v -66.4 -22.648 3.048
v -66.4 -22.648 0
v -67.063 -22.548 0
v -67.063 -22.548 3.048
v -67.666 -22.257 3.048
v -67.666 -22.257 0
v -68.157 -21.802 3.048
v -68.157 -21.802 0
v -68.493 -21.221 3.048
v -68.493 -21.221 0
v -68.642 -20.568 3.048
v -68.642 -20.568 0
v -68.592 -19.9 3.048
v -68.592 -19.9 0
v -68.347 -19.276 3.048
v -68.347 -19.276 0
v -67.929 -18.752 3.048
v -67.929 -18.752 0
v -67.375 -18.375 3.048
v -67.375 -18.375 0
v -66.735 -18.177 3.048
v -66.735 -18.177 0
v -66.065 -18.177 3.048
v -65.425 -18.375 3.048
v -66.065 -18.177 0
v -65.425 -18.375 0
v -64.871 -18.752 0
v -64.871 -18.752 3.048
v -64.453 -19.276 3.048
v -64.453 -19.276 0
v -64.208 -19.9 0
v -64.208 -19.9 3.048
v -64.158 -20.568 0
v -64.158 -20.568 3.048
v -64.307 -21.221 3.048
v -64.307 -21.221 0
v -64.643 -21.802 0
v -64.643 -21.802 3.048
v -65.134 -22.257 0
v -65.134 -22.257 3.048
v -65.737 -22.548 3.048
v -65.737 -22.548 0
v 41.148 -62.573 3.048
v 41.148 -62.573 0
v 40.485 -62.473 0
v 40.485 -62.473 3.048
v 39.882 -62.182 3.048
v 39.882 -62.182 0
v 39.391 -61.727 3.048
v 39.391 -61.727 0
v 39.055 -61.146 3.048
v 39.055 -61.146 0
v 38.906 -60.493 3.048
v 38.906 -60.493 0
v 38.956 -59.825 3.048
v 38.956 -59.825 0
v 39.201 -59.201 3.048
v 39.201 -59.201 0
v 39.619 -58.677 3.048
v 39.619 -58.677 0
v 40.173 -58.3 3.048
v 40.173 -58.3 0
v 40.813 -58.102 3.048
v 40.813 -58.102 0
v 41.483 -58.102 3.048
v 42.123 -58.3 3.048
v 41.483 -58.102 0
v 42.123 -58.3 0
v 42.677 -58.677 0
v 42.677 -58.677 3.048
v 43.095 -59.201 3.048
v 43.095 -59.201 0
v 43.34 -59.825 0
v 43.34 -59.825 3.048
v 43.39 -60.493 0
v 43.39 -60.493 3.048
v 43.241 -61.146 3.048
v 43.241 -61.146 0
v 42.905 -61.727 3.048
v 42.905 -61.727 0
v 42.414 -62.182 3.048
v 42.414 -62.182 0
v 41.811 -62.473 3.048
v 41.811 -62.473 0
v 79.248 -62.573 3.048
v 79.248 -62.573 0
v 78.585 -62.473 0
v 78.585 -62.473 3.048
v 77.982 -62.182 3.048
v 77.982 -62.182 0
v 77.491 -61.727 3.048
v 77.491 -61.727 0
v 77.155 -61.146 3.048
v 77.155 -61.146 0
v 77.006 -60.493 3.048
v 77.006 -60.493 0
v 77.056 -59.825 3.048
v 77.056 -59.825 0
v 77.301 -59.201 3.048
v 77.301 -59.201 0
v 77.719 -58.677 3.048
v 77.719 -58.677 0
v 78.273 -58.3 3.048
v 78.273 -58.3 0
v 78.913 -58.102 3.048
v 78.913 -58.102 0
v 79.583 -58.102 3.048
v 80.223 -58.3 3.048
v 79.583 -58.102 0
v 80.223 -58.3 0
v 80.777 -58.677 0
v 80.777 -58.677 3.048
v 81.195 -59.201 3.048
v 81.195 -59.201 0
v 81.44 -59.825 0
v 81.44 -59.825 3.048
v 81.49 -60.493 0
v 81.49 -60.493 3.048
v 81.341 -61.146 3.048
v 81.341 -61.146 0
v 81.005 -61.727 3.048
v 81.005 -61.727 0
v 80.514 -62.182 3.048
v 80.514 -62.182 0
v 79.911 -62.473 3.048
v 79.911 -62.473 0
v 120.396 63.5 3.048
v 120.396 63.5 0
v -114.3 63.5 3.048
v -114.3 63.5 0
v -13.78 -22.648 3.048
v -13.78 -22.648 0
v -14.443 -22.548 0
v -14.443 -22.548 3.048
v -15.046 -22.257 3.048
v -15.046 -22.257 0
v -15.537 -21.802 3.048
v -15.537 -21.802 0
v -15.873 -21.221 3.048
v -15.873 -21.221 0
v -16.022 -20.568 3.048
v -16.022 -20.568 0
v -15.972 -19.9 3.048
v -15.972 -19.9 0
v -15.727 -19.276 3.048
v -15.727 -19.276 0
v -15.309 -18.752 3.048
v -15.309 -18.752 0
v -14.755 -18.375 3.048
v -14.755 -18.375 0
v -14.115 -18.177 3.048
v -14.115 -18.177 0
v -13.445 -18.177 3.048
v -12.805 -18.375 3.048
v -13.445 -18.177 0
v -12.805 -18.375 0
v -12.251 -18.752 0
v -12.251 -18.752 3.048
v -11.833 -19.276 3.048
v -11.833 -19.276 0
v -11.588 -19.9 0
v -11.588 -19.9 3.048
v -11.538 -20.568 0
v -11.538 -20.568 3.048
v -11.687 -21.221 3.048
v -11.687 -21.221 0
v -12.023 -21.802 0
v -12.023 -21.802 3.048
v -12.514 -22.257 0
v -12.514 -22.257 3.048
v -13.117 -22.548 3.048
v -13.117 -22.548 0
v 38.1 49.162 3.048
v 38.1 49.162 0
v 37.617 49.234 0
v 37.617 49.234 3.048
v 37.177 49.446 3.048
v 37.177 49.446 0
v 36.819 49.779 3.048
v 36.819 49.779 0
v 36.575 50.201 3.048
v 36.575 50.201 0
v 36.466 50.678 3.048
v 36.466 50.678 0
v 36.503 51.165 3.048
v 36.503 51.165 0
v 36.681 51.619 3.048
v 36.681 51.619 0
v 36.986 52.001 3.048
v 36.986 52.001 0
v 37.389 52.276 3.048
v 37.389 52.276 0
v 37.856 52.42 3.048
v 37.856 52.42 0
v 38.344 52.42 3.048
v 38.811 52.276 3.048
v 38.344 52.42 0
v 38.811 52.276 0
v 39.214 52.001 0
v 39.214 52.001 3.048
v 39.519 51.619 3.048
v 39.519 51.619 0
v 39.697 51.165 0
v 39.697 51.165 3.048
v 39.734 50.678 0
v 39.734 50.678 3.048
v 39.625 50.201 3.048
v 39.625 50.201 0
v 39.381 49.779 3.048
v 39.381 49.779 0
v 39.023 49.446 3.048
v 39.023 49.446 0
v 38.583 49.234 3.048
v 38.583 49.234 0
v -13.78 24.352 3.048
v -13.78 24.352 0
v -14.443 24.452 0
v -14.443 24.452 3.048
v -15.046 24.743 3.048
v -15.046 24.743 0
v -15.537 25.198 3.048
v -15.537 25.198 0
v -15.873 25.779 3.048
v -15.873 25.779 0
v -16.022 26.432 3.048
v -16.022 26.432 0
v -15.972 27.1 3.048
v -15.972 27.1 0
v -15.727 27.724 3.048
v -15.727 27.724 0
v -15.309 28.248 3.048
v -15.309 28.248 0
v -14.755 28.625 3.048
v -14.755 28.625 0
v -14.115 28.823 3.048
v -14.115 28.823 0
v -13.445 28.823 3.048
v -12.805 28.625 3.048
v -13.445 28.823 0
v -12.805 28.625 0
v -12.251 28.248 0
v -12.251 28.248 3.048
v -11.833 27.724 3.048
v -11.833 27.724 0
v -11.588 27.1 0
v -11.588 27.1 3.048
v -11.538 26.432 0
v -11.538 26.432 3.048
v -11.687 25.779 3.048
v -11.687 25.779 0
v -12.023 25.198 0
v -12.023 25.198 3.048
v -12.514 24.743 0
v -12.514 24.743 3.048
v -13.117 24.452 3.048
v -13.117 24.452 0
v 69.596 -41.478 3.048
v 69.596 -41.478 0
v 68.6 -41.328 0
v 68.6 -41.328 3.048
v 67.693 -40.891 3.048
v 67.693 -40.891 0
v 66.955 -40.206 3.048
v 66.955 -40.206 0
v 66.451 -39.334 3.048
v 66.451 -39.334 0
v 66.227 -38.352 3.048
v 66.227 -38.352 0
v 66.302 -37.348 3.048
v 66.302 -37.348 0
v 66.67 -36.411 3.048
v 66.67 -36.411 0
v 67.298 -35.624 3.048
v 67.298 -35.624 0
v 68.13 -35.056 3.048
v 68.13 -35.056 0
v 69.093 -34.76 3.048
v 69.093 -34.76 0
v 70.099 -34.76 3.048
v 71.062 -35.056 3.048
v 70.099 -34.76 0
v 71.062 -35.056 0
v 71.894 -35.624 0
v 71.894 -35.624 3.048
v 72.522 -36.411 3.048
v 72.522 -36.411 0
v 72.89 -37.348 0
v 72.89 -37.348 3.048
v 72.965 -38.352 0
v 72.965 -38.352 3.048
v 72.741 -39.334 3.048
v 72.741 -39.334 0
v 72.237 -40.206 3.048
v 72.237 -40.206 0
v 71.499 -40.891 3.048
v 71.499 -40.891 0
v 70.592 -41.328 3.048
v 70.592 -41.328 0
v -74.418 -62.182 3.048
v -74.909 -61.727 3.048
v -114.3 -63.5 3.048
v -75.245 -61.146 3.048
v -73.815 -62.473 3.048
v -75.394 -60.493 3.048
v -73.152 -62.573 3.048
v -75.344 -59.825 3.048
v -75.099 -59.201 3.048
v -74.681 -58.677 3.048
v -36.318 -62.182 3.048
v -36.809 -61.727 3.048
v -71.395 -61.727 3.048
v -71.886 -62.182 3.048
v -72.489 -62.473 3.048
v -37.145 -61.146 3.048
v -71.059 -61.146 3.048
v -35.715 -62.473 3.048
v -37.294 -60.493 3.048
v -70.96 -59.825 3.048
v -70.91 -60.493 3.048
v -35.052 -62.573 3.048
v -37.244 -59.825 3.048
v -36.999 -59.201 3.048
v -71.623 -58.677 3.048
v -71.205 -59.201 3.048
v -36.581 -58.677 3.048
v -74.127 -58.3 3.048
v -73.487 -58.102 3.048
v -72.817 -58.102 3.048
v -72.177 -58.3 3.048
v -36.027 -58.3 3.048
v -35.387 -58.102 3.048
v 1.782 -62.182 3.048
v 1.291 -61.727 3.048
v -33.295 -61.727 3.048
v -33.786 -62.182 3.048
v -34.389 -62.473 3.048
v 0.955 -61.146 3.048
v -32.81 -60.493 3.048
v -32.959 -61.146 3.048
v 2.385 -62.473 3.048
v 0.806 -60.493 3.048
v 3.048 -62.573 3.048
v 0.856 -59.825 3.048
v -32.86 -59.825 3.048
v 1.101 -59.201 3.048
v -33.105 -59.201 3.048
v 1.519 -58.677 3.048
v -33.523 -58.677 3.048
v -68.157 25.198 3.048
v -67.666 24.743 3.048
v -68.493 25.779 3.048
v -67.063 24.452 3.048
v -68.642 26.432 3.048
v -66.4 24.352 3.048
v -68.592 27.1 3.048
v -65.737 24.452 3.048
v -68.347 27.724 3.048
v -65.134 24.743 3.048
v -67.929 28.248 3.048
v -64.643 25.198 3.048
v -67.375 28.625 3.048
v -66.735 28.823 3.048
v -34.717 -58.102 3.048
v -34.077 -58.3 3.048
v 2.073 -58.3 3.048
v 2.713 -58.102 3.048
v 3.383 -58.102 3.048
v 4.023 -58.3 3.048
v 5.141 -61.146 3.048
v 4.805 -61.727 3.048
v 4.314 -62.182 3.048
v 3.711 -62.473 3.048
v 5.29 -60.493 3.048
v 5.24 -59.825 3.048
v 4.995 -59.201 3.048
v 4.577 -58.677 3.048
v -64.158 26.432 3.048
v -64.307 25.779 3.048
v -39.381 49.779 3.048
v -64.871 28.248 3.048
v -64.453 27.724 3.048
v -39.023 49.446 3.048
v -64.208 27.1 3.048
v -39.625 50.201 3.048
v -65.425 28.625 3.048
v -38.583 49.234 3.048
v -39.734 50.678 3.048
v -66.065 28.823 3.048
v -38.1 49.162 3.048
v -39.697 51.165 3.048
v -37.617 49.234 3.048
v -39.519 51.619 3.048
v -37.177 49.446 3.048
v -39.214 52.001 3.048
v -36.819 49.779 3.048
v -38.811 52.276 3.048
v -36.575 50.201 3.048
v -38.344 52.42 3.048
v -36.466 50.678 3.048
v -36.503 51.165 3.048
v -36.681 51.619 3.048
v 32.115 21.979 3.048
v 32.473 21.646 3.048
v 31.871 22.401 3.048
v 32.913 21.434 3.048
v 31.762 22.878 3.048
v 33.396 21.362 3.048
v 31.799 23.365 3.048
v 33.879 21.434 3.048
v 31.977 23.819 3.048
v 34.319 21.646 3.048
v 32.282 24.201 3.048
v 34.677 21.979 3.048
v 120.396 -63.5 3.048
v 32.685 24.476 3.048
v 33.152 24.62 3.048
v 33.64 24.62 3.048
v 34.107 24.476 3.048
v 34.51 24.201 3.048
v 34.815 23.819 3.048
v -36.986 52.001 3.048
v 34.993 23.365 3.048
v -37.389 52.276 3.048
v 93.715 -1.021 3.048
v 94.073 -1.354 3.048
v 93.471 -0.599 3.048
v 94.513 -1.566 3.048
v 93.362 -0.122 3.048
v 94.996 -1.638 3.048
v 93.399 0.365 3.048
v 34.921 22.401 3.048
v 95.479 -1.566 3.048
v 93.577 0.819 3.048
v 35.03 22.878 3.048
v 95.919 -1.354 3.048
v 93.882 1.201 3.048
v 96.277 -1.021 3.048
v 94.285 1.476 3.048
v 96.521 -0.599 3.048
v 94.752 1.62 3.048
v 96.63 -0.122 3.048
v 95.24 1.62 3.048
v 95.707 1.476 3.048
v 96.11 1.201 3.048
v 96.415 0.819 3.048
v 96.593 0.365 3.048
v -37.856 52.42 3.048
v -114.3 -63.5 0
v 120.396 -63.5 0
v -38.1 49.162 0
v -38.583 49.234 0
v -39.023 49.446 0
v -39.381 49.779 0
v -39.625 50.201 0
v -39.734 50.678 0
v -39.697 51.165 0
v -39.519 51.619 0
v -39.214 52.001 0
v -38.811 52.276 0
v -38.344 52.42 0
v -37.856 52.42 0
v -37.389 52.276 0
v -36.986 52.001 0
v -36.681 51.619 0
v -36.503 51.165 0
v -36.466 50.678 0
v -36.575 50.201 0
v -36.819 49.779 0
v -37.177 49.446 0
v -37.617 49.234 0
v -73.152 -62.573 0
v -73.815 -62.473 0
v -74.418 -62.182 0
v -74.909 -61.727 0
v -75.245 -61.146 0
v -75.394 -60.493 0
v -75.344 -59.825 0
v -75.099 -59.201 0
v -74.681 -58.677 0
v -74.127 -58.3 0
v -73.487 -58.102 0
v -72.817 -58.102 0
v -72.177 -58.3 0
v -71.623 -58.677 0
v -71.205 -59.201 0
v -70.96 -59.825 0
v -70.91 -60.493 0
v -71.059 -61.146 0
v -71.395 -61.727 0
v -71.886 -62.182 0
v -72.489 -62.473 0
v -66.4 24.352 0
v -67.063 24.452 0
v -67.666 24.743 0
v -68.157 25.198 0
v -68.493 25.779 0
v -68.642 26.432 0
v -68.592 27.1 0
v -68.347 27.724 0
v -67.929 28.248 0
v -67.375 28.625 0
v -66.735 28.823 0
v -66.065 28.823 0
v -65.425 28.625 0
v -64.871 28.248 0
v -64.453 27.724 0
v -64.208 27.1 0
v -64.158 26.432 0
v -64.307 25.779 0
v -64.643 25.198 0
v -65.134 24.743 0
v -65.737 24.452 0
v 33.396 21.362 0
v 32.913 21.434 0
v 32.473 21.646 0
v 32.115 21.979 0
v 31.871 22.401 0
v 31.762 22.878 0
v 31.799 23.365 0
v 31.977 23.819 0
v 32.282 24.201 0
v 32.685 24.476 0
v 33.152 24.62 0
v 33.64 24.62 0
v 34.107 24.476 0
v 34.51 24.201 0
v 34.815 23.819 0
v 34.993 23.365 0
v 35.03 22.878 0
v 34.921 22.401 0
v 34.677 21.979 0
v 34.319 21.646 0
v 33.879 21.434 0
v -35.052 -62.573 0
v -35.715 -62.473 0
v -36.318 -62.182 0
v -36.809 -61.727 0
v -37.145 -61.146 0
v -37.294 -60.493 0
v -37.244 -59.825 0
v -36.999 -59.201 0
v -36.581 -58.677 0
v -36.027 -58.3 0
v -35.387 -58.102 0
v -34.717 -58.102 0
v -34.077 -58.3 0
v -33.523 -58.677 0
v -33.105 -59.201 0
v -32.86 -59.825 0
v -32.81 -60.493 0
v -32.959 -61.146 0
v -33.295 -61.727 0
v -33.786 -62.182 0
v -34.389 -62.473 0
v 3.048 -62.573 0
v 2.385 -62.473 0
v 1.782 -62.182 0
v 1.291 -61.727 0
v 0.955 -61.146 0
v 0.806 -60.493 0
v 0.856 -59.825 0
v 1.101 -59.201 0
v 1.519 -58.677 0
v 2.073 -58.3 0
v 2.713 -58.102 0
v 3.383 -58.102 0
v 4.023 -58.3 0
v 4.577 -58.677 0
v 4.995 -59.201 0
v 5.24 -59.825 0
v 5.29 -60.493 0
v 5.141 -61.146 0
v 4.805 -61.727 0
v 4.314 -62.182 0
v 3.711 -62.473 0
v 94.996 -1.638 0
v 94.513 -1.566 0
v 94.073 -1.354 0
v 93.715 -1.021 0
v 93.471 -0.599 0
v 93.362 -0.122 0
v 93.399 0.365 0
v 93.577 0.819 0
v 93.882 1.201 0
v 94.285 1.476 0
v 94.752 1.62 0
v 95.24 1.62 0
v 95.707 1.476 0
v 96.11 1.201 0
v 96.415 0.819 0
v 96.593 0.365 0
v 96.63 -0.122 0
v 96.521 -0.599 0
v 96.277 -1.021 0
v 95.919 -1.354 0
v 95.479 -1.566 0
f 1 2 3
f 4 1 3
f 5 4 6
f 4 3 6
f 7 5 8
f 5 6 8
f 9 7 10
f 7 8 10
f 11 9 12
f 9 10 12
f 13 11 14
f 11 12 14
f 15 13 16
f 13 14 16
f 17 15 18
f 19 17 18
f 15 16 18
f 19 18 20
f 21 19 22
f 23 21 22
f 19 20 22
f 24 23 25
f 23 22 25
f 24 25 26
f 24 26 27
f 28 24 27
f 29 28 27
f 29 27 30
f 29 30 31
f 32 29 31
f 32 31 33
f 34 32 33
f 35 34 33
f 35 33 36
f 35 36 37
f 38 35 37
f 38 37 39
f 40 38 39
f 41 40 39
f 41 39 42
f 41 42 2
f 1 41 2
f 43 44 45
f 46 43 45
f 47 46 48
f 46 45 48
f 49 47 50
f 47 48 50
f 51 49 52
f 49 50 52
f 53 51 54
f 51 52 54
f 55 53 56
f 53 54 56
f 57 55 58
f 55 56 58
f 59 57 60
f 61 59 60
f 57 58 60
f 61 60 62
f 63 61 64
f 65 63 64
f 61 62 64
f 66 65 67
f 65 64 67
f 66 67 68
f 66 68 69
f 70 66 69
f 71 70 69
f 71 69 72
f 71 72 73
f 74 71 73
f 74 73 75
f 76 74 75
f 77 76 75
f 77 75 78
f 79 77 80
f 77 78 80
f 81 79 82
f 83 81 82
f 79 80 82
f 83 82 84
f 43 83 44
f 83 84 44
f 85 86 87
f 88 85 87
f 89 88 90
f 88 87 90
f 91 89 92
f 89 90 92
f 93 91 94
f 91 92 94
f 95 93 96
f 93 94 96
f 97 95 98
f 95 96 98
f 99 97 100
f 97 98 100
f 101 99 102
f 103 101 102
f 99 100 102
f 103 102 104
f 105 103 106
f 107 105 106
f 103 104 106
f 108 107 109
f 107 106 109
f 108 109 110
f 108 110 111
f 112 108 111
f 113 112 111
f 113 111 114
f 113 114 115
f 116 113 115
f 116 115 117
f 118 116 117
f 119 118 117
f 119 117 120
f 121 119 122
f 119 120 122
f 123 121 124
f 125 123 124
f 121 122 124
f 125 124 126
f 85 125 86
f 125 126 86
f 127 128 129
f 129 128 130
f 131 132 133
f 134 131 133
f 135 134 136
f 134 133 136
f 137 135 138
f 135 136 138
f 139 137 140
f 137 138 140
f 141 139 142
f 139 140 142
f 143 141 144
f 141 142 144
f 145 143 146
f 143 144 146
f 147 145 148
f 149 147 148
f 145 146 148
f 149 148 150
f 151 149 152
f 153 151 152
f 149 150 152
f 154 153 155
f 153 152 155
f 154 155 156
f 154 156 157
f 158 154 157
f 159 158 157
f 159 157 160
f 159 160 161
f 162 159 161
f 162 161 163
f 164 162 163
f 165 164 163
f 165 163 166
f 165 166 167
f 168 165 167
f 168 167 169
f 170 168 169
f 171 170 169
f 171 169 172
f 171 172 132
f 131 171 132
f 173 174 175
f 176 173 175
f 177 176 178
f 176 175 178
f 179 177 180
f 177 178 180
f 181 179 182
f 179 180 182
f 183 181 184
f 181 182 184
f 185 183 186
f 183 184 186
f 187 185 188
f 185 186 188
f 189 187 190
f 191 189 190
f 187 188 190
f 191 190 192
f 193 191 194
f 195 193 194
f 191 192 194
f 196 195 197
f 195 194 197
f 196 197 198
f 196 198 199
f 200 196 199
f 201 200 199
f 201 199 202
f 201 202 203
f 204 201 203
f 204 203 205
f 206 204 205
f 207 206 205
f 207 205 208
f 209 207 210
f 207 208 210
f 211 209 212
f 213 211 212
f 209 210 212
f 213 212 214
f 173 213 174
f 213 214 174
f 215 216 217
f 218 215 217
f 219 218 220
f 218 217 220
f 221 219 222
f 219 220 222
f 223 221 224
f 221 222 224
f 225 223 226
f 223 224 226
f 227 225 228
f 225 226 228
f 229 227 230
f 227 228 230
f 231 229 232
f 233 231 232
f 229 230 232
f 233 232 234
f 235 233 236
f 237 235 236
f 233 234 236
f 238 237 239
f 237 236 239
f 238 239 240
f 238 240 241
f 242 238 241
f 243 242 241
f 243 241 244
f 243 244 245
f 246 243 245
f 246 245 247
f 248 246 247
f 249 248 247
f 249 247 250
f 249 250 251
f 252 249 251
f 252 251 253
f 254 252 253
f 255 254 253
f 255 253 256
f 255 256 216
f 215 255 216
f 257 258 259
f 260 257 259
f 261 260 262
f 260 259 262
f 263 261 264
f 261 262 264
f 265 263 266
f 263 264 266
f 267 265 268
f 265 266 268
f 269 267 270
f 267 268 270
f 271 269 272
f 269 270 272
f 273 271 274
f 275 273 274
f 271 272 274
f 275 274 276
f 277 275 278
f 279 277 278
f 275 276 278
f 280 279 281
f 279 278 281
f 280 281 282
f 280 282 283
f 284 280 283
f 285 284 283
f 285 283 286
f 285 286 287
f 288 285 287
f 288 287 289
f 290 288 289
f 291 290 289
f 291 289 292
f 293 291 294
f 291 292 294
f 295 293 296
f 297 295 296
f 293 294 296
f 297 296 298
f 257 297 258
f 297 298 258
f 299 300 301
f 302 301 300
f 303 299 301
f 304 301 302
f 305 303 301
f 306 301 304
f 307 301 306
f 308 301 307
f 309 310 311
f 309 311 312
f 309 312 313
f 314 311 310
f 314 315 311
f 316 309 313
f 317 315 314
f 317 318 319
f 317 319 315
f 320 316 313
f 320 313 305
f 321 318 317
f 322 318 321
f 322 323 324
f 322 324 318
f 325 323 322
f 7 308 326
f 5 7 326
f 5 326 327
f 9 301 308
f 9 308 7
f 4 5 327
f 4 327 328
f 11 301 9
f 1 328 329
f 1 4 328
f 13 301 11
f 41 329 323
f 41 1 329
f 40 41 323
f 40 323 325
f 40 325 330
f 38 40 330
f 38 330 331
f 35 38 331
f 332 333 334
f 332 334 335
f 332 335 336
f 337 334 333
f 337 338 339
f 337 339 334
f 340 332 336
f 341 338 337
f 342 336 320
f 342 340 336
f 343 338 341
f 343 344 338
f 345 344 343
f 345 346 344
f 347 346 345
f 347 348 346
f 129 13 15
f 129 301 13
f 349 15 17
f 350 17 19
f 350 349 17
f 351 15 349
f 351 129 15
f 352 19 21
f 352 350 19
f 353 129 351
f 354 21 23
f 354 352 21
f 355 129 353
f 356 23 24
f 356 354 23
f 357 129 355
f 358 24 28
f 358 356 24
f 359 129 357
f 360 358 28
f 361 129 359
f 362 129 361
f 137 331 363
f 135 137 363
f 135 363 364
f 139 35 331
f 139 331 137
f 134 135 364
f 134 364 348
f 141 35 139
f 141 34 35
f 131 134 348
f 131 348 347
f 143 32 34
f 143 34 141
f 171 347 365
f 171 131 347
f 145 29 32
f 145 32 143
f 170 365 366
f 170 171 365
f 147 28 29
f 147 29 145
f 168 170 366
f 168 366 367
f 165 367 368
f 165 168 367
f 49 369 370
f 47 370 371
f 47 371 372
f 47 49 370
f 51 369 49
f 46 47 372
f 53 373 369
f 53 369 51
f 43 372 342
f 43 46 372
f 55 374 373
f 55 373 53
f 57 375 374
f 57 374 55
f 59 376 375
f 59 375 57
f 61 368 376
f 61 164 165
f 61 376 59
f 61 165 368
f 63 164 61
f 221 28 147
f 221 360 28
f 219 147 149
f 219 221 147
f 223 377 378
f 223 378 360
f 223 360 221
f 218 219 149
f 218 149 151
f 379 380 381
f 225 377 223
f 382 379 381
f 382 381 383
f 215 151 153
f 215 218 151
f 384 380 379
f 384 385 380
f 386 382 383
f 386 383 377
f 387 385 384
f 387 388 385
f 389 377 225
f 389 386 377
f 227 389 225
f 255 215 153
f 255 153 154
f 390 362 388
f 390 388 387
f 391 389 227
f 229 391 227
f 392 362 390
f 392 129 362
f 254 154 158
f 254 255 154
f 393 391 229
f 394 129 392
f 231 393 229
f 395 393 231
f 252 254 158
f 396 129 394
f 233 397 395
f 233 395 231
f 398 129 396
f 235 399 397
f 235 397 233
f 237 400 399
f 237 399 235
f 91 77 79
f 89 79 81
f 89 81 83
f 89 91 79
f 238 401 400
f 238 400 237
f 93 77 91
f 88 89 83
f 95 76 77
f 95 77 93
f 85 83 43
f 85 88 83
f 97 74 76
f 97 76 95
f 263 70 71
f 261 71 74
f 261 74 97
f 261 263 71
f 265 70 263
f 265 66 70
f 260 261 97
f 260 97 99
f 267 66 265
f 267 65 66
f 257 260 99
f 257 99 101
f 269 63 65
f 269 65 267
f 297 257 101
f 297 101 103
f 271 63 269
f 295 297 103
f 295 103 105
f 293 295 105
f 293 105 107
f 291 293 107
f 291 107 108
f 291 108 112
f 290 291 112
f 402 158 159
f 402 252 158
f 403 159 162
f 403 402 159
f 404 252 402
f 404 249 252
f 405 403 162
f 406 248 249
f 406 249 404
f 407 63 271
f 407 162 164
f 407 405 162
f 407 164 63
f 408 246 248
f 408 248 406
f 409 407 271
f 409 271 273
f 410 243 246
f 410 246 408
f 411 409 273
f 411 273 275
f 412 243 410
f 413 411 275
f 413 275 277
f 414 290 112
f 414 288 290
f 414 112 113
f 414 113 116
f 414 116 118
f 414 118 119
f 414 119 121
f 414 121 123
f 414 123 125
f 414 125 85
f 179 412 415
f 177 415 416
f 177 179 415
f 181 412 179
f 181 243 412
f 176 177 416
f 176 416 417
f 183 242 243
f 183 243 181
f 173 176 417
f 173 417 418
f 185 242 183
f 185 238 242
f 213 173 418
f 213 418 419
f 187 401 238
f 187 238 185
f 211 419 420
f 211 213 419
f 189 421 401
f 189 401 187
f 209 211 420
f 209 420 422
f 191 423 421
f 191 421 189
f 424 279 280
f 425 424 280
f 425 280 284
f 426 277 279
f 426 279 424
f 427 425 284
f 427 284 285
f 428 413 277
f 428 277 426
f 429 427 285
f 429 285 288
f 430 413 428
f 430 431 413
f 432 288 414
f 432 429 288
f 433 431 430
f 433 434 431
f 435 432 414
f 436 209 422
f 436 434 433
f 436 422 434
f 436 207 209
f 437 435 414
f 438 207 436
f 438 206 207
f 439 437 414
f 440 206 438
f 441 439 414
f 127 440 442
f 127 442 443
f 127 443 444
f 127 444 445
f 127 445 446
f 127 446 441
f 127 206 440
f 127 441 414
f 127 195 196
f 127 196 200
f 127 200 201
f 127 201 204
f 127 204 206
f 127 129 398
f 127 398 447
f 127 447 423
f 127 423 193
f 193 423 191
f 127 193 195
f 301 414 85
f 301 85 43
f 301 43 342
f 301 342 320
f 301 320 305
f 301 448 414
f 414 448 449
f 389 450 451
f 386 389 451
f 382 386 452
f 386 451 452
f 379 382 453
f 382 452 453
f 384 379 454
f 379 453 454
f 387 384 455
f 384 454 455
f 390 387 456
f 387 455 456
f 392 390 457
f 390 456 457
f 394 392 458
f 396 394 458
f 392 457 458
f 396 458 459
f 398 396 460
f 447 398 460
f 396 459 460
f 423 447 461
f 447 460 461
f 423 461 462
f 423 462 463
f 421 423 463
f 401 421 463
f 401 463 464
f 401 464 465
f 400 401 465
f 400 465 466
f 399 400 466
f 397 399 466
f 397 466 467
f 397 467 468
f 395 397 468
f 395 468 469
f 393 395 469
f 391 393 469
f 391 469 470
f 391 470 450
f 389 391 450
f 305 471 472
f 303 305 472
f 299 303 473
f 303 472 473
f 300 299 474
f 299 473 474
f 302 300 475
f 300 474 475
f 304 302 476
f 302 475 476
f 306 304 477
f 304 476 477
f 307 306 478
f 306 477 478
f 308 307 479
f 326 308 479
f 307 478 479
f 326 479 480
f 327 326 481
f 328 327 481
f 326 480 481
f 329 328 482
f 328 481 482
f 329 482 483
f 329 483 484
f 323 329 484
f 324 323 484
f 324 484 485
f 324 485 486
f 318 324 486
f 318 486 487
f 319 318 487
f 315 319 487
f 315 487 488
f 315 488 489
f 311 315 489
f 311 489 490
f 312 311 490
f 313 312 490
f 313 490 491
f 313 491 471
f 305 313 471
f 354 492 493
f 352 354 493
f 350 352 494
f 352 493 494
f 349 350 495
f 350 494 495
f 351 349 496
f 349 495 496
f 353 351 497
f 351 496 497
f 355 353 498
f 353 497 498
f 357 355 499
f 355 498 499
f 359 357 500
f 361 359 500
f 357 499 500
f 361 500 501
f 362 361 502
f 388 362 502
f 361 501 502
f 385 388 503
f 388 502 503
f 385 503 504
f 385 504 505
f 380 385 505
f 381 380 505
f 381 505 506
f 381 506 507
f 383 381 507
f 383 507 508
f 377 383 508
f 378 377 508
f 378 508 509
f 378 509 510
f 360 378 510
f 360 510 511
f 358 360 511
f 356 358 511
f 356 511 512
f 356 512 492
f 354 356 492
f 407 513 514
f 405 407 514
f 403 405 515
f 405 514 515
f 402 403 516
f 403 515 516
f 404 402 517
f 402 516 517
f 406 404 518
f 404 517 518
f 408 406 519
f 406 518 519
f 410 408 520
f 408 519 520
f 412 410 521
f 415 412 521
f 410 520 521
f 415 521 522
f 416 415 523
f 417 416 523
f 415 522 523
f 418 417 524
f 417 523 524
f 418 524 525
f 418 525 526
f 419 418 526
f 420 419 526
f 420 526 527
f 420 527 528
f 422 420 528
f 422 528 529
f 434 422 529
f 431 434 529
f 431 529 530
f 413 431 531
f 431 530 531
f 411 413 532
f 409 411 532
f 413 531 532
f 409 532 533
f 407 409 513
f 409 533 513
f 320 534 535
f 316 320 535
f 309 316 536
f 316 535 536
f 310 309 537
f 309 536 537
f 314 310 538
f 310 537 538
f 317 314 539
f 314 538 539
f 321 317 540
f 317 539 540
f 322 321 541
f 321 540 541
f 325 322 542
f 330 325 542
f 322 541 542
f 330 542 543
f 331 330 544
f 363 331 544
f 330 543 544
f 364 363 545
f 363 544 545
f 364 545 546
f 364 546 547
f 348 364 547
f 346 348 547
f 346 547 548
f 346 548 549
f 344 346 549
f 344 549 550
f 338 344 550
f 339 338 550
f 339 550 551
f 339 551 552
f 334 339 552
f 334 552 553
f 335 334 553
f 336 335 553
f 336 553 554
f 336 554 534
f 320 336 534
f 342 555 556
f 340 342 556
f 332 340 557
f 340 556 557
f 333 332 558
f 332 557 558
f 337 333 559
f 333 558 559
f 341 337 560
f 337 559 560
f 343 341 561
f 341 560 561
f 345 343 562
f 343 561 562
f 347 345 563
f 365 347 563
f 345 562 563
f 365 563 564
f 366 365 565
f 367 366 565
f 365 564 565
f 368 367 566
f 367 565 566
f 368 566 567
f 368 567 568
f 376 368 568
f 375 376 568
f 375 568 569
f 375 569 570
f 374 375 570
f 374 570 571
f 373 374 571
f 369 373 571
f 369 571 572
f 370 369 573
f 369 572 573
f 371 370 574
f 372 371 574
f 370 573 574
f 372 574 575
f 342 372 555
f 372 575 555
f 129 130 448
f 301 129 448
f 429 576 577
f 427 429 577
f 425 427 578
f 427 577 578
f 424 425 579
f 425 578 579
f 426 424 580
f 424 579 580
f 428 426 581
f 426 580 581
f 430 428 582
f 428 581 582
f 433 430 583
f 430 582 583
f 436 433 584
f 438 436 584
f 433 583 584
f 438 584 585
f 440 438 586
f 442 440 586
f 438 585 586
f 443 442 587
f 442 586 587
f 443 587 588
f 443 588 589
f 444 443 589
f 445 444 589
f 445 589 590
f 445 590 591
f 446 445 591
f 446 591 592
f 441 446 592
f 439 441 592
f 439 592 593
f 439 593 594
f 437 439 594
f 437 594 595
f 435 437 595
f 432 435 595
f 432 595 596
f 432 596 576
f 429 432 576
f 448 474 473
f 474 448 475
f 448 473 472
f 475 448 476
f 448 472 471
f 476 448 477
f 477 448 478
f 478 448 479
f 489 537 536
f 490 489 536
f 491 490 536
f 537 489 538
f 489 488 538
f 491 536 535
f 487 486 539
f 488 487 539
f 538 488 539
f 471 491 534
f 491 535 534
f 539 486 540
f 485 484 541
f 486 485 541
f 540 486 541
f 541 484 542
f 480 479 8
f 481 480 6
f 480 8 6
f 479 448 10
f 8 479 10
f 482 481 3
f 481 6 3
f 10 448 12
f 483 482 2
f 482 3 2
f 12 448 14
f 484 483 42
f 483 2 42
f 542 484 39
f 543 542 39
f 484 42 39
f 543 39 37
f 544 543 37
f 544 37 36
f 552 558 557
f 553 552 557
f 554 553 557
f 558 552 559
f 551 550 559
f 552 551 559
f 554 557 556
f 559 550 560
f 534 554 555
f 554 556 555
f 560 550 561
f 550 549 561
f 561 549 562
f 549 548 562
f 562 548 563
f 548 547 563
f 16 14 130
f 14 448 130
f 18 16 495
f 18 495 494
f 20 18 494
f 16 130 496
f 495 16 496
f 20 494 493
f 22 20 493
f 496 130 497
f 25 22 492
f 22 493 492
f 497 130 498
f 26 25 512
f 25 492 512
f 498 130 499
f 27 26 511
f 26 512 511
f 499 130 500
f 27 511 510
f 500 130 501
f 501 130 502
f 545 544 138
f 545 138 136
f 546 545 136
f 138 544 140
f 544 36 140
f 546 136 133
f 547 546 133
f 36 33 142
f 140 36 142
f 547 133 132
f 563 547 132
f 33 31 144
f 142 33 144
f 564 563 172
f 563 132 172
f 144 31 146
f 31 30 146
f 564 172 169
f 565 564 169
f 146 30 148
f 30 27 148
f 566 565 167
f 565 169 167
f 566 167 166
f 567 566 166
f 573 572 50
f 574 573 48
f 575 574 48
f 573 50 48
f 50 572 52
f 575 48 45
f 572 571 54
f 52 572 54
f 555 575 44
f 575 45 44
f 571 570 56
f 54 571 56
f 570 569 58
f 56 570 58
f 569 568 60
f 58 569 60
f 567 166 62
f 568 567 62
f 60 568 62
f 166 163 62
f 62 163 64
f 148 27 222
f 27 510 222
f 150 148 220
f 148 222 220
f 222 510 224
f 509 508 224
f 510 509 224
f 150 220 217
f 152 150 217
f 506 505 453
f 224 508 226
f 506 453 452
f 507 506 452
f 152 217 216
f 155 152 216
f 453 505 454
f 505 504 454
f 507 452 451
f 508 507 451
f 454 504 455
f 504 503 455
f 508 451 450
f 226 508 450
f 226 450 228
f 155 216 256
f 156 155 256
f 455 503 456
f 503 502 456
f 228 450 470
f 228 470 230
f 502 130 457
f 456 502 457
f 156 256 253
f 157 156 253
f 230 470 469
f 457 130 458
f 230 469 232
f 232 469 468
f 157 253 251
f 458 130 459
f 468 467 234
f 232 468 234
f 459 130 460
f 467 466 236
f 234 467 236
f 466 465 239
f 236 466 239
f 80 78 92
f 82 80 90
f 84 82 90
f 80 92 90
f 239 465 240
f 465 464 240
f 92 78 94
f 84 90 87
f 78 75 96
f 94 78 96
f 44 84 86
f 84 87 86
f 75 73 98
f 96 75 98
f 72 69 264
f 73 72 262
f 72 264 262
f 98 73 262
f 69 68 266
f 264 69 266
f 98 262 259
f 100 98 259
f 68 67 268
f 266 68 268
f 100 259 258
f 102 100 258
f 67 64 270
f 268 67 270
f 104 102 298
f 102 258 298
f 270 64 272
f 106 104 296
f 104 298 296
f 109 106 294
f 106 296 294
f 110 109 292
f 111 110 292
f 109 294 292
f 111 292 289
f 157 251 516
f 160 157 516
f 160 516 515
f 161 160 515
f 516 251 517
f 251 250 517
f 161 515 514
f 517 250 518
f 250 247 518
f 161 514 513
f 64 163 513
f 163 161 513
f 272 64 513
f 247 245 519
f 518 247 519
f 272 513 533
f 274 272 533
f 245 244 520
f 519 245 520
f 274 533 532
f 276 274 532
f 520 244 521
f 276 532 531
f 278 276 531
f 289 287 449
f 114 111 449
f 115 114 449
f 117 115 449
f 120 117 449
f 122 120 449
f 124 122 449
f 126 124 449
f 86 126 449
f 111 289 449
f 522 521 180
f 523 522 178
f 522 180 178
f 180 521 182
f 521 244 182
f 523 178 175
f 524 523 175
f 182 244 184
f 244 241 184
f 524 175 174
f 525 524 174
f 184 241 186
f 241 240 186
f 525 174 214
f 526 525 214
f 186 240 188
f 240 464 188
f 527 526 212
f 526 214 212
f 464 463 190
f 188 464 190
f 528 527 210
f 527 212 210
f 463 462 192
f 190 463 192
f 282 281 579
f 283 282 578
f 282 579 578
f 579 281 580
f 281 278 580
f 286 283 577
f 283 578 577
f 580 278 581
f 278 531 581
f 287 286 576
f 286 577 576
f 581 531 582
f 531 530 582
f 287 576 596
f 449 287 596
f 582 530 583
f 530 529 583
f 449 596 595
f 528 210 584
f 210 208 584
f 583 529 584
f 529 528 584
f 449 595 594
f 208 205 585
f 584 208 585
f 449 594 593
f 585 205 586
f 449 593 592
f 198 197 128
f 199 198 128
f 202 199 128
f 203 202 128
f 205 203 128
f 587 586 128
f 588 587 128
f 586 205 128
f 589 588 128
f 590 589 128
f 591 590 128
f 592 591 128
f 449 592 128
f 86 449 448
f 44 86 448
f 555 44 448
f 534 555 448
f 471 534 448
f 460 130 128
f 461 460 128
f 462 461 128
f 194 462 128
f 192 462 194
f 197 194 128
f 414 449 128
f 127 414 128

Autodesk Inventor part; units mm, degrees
ref_plane "YZ Plane" through (0, 0, 0) normal (1, 0, 0) x (0, 1, 0)
ref_plane "XZ Plane" through (0, 0, 0) normal (0, 1, 0) x (-1, 0, 0)
ref_plane "XY Plane" through (0, 0, 0) normal (0, 0, 1) x (1, 0, 0)
sketch "Sketch1" plane through (0, 0, 0) normal (0, 0, 1) x (1, 0, 0)
  line L0 (120.396, 63.5) -> (-114.3, 63.5)
  line L1 (-114.3, 63.5) -> (-114.3, -63.5)
  line L2 (-114.3, -63.5) -> (120.396, -63.5)
  line L3 (120.396, -63.5) -> (120.396, 63.5)
  point P0 (0, 0)
  dimension "d0" = 234.696
  dimension "d1" = 127
extrude "Plate1" add sketch "Sketch1" along normal blind 3.048
sketch "Sketch2" plane through (0, 0, 3.048) normal (0, 0, 1) x (1, 0, 0)
  line L0 (-114.3, 63.5) -> (-114.3, -63.5) projected
  line L1 (-114.3, -63.5) -> (-114.3, -60.325)
  line L2 (-114.3, -60.325) -> (-73.152, -60.325)
  line L3 (-73.152, -60.325) -> (-35.052, -60.325)
  line L4 (-35.052, -60.325) -> (3.048, -60.325)
  line L5 (3.048, -60.325) -> (41.148, -60.325)
  line L6 (41.148, -60.325) -> (79.248, -60.325)
  line L7 (79.248, -60.325) -> (120.396, -60.325)
  line L8 (120.396, -63.5) -> (120.396, 63.5) projected
  point P0 (0, 0)
  dimension "d3" = 3.175
  dimension "d4" = 41.148
  dimension "d5" = 38.1
  dimension "d6" = 38.1
  dimension "d7" = 38.1
  dimension "d8" = 38.1
hole "Hole1" at (-73.152, -60.325, 3.048) at (-35.052, -60.325, 3.048) at (3.048, -60.325, 3.048) at (41.148, -60.325, 3.048) at (79.248, -60.325, 3.048) direction (0, 0, -1) diameter 4.4958 depth 3.048 clearance for "Hex Machine Screw" size "#8" standard "Ansi Unified Screw Threads"
sketch "Sketch3" plane through (0, 0, 3.048) normal (0, 0, 1) x (1, 0, 0)
  line L0 (-114.3, -63.5) -> (120.396, -63.5) projected
  line L1 (-114.3, -63.5) -> (-114.3, -50.8)
  line L2 (-114.3, 63.5) -> (-114.3, -63.5) projected
  line L3 (-114.3, -50.8) -> (-114.3, -25.4)
  line L4 (-114.3, -25.4) -> (-88.9, -25.4)
  line L5 (-88.9, -25.4) -> (-88.9, 31.6)
  line L6 (-88.9, 31.6) -> (-43.9, 31.6)
  line L7 (-43.9, 31.6) -> (-43.9, -25.4)
  line L8 (-43.9, -25.4) -> (-88.9, -25.4)
  line L9 (-43.9, 31.6) -> (-36.28, 31.6)
  line L10 (-36.28, 31.6) -> (-36.28, -25.4)
  line L11 (-36.28, -25.4) -> (8.72, -25.4)
  line L12 (8.72, -25.4) -> (8.72, 31.6)
  line L13 (8.72, 31.6) -> (-36.28, 31.6)
  point P0 (0, 0)
  dimension "d16" = 12.7
  dimension "d17" = 25.4
  dimension "d18" = 25.4
  dimension "d19" = 57
  dimension "d20" = 45
  dimension "d21" = 7.62
  dimension "d22" = 45
sketch "Sketch4" plane through (0, 0, 3.048) normal (0, 0, 1) x (1, 0, 0)
  line L0 (-88.9, 31.6) -> (-43.9, 31.6) projected
  line L1 (-43.9, -25.4) -> (-88.9, -25.4) projected
  line L2 (-36.28, -25.4) -> (8.72, -25.4) projected
  line L3 (8.72, 31.6) -> (-36.28, 31.6) projected
  line L4 (-66.4, 31.6) -> (-66.4, 26.6)
  line L5 (-66.4, -25.4) -> (-66.4, -20.4)
  line L6 (-13.78, -25.4) -> (-13.78, -20.4)
  line L7 (-13.78, 31.6) -> (-13.78, 26.6)
  point P0 (0, 0)
  dimension "d23" = 5
  dimension "d24" = 5
  dimension "d25" = 5
  dimension "d26" = 5
hole "Hole2" at (-66.4, 26.6, 3.048) at (-66.4, -20.4, 3.048) at (-13.78, -20.4, 3.048) at (-13.78, 26.6, 3.048) direction (0, 0, -1) diameter 4.4958 depth 3.048 clearance for "Hex Machine Screw" size "#8" standard "Ansi Unified Screw Threads"
sketch "Sketch5" plane through (0, 0, 3.048) normal (0, 0, 1) x (1, 0, 0)
  line L0 (-114.3, -63.5) -> (120.396, -63.5) projected
  line L1 (120.396, -63.5) -> (120.396, -50.8)
  line L2 (120.396, -63.5) -> (120.396, 63.5) projected
  line L3 (120.396, -50.8) -> (120.396, 0)
  line L4 (120.396, 0) -> (94.996, 0)
  line L5 (94.996, 0) -> (94.996, 61.6)
  line L6 (94.996, 61.6) -> (71.996, 61.6)
  line L7 (8.72, -25.4) -> (8.72, 31.6) projected
  line L8 (94.996, 0) -> (33.396, 0)
  line L9 (33.396, 0) -> (33.396, 23)
  line L10 (94.996, 0) -> (94.996, 23)
  point P0 (0, 0)
  dimension "d34" = 12.7
  dimension "d35" = 50.8
  dimension "d36" = 25.4
  dimension "d37" = 61.6
  dimension "d38" = 23
  dimension "d46" = 61.6
  dimension "d47" = 23
hole "Hole3" at (33.396, 23, 3.048) at (94.996, 0, 3.048) direction (0, 0, -1) diameter 3.2766 depth 3.048 clearance for "Hex Machine Screw" size "#4" standard "Ansi Unified Screw Threads"
sketch "Sketch6" plane through (0, 0, 3.048) normal (0, 0, 1) x (1, 0, 0)
  line L0 (-114.3, -63.5) -> (-114.3, 63.5) projected
  line L1 (-114.3, 63.5) -> (-114.3, 50.8)
  line L2 (-114.3, 50.8) -> (-38.1, 50.8)
  line L3 (-38.1, 50.8) -> (38.1, 50.8)
  point P0 (0, 0)
  dimension "d48" = 12.7
  dimension "d49" = 76.2
  dimension "d50" = 76.2
hole "Hole4" at (-38.1, 50.8, 3.048) at (38.1, 50.8, 3.048) direction (0, 0, -1) diameter 3.2766 end through all clearance for "Flat Head Machine Screw (82)" size "#4" standard "Ansi Unified Screw Threads"
sketch "Sketch7" plane through (0, 0, 3.048) normal (0, 0, 1) x (1, 0, 0)
  line L0 (120.396, -63.5) -> (69.596, -63.5)
  line L1 (120.396, -63.5) -> (-114.3, -63.5) projected
  line L2 (69.596, -63.5) -> (69.596, -38.1)
  line L3 (69.596, -38.1) -> (44.196, -38.1)
  line L4 (44.196, -38.1) -> (18.796, -38.1)
  point P0 (0, 0)
  dimension "d58" = 50.8
  dimension "d59" = 25.4
  dimension "d60" = 25.4
  dimension "d61" = 25.4
hole "Hole5" at (69.596, -38.1, 3.048) direction (0, 0, -1) diameter 6.7564 depth 3.048 clearance for "Flat Head Machine Screw (82)" size "1/4" standard "Ansi Unified Screw Threads"
equation "\"d14\" = Thickness"
equation "\"d32\" = Thickness"
equation "\"d44\" = Thickness"
equation "\"d56\" = Thickness"
equation "\"d67\" = Thickness"
equation "\"d2\" = Thickness"
equation "\"BendRadius\" = Thickness"
equation "\"BendReliefWidth\" = Thickness"
equation "\"BendReliefDepth\" = 0.5 * Thickness"
equation "\"CornerReliefSize\" = 4 * Thickness"
equation "\"MinimumRemnant\" = 2 * Thickness"
equation "\"TransitionRadius\" = BendRadius"
equation "\"JacobiRadiusSize\" = BendRadius"
equation "\"GapSize\" = Thickness"
equation "\"Thickness\" = 3.048"
properties part number "sheetmetalback2.0"
